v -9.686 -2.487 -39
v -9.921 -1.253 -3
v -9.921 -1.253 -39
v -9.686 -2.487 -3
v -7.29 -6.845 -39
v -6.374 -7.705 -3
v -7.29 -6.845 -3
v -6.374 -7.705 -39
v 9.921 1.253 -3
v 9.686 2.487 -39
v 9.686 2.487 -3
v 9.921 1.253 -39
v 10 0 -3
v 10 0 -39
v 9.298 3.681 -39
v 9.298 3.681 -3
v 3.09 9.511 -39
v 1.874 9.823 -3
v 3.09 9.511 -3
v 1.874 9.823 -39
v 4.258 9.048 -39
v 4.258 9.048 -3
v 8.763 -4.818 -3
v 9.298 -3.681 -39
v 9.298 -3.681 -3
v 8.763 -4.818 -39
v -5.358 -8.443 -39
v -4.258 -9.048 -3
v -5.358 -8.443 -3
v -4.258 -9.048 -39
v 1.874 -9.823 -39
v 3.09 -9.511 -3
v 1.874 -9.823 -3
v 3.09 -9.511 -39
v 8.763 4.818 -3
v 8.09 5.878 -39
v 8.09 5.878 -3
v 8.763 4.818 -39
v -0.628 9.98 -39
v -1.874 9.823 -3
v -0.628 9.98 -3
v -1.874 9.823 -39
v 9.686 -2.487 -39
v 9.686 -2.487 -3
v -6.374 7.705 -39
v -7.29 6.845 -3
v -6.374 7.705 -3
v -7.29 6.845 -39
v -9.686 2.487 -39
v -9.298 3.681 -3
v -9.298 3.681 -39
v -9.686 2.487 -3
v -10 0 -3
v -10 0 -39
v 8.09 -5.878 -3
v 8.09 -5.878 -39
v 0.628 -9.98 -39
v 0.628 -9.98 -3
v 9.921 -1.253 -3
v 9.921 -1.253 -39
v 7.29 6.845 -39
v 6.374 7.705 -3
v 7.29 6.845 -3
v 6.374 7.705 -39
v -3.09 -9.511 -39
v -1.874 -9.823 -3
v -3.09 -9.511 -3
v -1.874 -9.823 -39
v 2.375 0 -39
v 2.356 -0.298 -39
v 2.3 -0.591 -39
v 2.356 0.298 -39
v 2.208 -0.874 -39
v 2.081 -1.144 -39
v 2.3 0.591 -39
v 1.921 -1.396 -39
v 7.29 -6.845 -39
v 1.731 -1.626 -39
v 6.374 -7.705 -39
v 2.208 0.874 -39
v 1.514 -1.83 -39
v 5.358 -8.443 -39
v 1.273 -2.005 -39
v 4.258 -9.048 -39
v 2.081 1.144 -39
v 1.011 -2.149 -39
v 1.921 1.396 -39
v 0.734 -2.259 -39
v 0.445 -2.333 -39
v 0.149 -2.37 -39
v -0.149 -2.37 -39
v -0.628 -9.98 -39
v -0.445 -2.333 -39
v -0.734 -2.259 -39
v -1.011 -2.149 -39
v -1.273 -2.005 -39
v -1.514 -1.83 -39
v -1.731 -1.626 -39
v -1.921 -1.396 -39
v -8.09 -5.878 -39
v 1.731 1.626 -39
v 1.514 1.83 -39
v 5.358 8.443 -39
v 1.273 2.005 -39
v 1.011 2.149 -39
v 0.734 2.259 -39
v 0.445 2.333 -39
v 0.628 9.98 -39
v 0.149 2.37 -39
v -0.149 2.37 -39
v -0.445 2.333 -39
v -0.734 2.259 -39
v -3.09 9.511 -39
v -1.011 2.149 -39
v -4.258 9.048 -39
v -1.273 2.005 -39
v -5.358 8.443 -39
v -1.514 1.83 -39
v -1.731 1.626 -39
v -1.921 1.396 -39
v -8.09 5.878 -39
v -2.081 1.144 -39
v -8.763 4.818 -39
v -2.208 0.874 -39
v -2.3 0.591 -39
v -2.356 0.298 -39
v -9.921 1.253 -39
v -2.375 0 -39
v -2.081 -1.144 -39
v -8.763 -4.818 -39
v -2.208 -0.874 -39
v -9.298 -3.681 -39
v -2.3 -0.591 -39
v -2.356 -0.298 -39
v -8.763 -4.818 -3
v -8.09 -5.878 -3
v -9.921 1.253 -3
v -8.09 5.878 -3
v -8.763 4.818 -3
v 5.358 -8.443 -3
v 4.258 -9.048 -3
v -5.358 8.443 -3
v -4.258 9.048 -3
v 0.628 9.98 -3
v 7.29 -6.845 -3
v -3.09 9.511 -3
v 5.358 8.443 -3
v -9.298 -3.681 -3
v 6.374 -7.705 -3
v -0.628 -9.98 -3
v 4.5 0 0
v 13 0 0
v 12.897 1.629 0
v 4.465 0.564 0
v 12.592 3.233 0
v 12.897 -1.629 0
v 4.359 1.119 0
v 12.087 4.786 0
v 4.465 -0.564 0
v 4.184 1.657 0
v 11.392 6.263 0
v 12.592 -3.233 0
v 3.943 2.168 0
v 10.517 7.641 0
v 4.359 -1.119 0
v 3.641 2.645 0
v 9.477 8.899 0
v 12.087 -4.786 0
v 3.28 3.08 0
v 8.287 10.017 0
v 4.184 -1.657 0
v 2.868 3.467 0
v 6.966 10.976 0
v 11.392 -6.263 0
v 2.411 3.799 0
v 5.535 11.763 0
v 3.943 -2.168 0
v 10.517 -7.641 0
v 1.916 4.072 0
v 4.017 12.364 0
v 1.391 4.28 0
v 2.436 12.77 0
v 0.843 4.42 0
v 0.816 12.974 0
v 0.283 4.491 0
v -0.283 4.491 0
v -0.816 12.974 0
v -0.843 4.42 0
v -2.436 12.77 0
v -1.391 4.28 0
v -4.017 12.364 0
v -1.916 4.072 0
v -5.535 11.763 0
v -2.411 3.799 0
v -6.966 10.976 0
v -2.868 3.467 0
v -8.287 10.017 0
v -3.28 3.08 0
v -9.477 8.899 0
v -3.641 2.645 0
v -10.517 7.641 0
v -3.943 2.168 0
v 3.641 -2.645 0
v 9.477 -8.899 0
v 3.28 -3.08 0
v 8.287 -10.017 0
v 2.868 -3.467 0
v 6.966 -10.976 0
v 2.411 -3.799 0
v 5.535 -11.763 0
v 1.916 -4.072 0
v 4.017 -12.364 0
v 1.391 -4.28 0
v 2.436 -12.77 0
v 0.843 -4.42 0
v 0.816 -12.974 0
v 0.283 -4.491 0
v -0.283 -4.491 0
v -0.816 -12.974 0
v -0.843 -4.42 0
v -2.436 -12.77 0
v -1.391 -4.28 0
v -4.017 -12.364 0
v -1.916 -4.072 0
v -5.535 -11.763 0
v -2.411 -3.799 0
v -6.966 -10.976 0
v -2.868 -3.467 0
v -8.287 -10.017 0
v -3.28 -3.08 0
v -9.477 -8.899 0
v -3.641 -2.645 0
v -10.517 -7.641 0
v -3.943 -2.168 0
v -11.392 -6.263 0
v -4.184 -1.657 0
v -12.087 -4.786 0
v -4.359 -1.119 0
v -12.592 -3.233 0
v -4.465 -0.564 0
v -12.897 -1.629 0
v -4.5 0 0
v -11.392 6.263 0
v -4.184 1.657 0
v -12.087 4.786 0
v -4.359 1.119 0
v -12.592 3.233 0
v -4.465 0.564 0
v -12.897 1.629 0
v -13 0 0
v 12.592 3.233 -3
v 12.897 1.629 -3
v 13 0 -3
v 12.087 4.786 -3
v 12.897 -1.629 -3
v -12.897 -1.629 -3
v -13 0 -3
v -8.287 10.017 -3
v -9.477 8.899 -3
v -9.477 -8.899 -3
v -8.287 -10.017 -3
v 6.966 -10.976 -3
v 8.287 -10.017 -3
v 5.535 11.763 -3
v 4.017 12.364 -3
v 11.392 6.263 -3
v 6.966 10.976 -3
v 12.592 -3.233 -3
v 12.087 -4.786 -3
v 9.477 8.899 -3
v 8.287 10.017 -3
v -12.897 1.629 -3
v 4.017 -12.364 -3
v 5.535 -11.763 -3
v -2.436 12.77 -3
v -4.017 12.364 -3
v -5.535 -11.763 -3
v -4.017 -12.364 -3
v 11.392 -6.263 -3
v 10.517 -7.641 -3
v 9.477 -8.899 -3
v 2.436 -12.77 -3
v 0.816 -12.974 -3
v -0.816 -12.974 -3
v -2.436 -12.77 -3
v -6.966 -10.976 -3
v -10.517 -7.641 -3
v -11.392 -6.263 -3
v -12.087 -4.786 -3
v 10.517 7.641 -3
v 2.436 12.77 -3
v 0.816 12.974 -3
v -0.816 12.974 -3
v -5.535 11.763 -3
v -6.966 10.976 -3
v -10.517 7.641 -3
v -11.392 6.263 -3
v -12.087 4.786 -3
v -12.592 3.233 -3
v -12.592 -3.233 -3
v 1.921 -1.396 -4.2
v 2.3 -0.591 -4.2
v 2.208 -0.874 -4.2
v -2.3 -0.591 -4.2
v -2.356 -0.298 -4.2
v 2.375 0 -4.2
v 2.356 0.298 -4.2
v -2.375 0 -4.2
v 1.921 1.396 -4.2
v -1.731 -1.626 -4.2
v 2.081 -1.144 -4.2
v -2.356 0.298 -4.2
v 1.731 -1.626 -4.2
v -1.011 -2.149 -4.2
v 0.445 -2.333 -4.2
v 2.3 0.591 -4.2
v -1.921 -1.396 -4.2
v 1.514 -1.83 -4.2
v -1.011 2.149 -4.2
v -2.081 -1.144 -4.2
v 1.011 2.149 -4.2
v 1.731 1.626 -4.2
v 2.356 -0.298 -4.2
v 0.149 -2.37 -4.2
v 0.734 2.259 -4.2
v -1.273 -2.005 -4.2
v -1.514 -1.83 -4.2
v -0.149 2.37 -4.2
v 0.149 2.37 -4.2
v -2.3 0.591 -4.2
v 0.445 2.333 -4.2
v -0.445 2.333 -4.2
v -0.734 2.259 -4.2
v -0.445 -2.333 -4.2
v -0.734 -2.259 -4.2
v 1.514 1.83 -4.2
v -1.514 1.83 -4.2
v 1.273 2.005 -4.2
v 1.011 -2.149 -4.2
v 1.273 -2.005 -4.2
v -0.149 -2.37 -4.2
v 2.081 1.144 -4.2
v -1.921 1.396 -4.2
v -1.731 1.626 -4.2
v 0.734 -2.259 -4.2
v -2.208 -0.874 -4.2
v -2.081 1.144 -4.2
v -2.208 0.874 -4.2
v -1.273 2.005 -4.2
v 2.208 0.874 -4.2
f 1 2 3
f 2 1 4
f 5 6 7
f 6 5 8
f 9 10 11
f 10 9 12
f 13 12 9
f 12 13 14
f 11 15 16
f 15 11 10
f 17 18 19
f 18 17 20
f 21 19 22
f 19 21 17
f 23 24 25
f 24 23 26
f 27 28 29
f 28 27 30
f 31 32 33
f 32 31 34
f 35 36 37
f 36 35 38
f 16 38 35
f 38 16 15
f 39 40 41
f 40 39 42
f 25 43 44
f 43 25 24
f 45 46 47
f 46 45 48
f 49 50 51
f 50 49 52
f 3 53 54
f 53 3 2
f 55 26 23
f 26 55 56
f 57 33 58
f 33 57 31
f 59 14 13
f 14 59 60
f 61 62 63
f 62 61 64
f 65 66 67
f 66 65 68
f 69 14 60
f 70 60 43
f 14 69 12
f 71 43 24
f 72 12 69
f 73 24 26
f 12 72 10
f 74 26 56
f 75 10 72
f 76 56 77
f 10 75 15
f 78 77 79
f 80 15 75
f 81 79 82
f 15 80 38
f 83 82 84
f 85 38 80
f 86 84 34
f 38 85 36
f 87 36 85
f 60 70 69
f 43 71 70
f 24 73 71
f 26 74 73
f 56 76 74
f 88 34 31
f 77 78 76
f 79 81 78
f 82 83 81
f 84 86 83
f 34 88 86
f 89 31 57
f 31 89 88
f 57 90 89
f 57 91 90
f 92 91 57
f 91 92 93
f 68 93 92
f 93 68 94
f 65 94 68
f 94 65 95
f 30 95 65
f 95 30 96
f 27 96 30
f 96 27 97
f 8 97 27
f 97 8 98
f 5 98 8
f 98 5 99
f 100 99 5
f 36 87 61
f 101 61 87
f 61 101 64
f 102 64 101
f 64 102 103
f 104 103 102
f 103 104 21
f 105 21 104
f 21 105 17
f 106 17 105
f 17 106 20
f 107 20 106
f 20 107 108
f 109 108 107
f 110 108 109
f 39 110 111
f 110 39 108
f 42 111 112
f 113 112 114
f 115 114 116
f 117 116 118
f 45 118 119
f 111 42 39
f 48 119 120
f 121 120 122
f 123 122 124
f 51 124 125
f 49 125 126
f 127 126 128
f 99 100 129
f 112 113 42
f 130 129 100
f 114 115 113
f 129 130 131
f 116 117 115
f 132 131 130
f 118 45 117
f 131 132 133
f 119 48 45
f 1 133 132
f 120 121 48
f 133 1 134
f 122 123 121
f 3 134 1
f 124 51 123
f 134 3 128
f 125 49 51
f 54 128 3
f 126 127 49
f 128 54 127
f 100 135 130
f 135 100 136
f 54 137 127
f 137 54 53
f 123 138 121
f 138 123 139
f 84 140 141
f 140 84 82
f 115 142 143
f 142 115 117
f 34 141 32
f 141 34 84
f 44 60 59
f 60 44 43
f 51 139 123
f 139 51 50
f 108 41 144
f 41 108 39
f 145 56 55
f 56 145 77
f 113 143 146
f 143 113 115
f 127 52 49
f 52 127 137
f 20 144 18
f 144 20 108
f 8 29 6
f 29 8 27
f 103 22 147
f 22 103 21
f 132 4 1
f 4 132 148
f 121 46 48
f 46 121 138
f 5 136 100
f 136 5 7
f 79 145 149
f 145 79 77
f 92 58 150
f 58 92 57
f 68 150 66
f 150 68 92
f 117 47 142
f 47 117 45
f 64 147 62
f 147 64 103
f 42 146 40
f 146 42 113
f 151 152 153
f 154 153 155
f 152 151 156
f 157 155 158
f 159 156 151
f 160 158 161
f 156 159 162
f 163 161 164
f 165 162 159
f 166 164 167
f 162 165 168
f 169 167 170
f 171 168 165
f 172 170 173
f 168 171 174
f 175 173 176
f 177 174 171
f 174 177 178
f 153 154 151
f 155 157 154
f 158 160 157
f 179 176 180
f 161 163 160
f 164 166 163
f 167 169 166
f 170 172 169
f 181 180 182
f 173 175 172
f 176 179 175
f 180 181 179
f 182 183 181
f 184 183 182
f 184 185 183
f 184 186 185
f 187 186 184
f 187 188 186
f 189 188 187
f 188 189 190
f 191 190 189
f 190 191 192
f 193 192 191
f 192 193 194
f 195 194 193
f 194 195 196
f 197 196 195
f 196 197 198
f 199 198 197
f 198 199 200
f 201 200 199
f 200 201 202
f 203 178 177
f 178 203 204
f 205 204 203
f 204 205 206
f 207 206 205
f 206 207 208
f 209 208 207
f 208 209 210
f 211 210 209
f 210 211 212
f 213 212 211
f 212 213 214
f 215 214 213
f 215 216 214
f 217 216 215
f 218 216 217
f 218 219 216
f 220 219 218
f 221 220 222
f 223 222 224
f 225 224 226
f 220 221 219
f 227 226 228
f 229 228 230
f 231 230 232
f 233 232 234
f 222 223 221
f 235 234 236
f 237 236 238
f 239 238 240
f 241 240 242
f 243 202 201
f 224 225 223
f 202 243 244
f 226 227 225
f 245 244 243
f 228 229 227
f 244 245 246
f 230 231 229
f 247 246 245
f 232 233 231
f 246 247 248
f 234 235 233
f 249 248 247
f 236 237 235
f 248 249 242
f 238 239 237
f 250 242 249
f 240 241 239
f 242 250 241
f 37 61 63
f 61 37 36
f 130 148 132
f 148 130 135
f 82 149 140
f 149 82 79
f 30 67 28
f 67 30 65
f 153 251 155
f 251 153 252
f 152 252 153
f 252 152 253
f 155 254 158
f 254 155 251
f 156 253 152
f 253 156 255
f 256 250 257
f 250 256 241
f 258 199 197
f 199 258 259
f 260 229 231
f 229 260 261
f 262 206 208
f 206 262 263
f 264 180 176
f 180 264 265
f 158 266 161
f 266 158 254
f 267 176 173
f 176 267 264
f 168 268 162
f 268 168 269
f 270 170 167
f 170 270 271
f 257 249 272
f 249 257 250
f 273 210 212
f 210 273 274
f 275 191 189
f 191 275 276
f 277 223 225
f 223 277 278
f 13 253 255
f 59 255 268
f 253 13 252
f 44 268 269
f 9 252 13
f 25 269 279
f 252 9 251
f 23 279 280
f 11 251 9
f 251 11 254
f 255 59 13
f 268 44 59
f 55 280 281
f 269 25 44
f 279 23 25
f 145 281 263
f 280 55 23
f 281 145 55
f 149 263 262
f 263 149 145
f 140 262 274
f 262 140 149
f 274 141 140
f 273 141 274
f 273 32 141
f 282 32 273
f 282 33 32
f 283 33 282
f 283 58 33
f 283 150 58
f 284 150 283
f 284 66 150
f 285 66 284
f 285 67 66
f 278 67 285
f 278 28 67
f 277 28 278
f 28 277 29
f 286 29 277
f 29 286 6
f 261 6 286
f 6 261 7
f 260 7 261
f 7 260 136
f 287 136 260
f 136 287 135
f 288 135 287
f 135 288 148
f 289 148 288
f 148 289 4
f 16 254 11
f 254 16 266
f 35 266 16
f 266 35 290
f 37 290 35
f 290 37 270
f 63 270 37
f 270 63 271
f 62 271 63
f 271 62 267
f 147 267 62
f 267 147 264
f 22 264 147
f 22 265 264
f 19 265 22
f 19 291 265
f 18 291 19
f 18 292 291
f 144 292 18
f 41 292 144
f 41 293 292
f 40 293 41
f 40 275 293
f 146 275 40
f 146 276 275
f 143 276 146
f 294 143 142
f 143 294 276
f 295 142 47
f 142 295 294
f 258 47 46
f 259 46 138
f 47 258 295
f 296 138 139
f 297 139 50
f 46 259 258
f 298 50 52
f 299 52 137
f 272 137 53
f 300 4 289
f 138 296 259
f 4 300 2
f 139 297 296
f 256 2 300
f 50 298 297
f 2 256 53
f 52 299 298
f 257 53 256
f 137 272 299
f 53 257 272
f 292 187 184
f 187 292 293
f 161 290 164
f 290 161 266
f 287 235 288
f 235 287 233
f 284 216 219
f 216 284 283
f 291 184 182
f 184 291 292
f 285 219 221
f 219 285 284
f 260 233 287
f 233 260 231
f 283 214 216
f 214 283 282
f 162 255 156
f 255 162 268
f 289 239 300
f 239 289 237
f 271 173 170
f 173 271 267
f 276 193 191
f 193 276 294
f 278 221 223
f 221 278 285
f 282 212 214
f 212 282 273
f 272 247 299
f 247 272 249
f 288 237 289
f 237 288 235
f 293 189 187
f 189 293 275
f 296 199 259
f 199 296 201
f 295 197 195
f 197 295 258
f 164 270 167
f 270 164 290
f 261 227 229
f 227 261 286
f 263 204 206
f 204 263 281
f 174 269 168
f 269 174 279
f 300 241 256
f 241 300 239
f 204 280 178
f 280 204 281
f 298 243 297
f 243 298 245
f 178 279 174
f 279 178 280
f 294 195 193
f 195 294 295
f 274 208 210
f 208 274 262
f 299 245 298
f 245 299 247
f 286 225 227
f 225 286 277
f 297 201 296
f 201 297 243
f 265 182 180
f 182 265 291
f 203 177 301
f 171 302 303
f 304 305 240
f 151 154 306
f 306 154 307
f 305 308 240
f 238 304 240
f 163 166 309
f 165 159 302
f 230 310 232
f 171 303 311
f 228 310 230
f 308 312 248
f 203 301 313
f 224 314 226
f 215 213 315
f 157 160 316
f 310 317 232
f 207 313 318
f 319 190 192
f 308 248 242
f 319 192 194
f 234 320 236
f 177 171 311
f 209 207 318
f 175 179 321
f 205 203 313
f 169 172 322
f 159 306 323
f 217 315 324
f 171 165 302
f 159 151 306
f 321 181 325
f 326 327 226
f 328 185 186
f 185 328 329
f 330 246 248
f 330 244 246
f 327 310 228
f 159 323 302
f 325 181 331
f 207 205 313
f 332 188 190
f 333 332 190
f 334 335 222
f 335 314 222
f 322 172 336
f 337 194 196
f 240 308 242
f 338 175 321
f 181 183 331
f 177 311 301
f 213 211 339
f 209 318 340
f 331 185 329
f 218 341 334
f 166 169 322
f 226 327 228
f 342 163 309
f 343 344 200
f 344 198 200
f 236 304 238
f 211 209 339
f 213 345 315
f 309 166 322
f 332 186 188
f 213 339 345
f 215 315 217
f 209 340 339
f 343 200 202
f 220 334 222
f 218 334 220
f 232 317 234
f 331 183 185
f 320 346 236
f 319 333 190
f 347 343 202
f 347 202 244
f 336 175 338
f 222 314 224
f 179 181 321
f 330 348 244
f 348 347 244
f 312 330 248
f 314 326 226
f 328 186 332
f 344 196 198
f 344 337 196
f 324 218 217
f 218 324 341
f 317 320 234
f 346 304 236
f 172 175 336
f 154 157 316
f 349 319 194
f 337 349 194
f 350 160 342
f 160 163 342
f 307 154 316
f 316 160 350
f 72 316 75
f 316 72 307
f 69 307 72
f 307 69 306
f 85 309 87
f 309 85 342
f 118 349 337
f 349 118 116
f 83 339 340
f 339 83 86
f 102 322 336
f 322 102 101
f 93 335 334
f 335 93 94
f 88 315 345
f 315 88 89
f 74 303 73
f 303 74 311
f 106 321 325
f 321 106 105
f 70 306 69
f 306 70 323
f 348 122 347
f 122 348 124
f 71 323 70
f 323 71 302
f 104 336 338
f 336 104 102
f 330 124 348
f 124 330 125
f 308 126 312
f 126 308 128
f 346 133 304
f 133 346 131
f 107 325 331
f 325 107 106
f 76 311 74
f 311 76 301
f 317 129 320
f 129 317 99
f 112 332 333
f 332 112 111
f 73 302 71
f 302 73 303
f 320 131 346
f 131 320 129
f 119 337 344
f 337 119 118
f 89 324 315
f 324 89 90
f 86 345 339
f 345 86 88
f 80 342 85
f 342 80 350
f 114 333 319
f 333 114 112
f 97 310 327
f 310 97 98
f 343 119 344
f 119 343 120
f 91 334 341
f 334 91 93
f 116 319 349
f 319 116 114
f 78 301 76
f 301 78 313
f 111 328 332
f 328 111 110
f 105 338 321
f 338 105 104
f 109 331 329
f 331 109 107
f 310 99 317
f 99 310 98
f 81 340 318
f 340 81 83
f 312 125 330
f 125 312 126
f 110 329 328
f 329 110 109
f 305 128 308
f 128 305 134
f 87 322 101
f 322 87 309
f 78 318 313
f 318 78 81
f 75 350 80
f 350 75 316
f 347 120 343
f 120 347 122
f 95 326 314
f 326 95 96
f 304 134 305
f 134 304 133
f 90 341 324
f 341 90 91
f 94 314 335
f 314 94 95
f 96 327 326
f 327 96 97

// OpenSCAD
$fn = 50;


difference() {
	union() {
		translate(v = [0, 0, -39.0000000000]) {
			cylinder(h = 39, r = 10.0000000000);
		}
		translate(v = [0, 0, -3.0000000000]) {
			cylinder(h = 3, r = 13.0000000000);
		}
	}
	union() {
		translate(v = [0, 0, 0]) {
			rotate(a = [0, 0, 0]) {
				difference() {
					union() {
						#translate(v = [0, 0, -39.0000000000]) {
							cylinder(h = 39, r = 2.2500000000);
						}
						#translate(v = [0, 0, -4.2000000000]) {
							cylinder(h = 4.2000000000, r1 = 2.3750000000, r2 = 4.5000000000);
						}
						#translate(v = [0, 0, -39.0000000000]) {
							cylinder(h = 39, r = 2.3750000000);
						}
						#translate(v = [0, 0, -39.0000000000]) {
							cylinder(h = 39, r = 2.2500000000);
						}
					}
					union();
				}
			}
		}
	}
}
